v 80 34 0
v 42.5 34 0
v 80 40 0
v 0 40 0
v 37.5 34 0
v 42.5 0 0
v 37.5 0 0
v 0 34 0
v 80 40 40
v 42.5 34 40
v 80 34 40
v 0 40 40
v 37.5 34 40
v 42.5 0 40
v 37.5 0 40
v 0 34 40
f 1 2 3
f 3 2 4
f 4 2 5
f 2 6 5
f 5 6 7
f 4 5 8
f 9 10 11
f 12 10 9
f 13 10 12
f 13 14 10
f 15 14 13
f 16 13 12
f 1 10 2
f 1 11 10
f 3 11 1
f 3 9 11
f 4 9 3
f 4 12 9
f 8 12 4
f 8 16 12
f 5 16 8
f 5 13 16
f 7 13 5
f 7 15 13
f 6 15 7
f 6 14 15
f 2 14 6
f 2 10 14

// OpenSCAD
$fn = 32;

// ----------------------------------------------------------------------
// Structural section: tee 80 x 40 mm
// ----------------------------------------------------------------------

// --- parameters (mm) ---
sec_w = 80;               // tee width, X
sec_h = 40;               // tee height, Y
flange_t = 6;             // top flange thickness
web_t = 5;                // web thickness
plate_t = 40;             // cut length, Z (extrusion height)

profile = [[37.5, 0], [42.5, 0], [42.5, 34], [80, 34], [80, 40], [0, 40], [0, 34], [37.5, 34]];  // primary outline, 8 points, counter clockwise

// --- the one profile operation ---
linear_extrude(height = plate_t) polygon(points = profile);
